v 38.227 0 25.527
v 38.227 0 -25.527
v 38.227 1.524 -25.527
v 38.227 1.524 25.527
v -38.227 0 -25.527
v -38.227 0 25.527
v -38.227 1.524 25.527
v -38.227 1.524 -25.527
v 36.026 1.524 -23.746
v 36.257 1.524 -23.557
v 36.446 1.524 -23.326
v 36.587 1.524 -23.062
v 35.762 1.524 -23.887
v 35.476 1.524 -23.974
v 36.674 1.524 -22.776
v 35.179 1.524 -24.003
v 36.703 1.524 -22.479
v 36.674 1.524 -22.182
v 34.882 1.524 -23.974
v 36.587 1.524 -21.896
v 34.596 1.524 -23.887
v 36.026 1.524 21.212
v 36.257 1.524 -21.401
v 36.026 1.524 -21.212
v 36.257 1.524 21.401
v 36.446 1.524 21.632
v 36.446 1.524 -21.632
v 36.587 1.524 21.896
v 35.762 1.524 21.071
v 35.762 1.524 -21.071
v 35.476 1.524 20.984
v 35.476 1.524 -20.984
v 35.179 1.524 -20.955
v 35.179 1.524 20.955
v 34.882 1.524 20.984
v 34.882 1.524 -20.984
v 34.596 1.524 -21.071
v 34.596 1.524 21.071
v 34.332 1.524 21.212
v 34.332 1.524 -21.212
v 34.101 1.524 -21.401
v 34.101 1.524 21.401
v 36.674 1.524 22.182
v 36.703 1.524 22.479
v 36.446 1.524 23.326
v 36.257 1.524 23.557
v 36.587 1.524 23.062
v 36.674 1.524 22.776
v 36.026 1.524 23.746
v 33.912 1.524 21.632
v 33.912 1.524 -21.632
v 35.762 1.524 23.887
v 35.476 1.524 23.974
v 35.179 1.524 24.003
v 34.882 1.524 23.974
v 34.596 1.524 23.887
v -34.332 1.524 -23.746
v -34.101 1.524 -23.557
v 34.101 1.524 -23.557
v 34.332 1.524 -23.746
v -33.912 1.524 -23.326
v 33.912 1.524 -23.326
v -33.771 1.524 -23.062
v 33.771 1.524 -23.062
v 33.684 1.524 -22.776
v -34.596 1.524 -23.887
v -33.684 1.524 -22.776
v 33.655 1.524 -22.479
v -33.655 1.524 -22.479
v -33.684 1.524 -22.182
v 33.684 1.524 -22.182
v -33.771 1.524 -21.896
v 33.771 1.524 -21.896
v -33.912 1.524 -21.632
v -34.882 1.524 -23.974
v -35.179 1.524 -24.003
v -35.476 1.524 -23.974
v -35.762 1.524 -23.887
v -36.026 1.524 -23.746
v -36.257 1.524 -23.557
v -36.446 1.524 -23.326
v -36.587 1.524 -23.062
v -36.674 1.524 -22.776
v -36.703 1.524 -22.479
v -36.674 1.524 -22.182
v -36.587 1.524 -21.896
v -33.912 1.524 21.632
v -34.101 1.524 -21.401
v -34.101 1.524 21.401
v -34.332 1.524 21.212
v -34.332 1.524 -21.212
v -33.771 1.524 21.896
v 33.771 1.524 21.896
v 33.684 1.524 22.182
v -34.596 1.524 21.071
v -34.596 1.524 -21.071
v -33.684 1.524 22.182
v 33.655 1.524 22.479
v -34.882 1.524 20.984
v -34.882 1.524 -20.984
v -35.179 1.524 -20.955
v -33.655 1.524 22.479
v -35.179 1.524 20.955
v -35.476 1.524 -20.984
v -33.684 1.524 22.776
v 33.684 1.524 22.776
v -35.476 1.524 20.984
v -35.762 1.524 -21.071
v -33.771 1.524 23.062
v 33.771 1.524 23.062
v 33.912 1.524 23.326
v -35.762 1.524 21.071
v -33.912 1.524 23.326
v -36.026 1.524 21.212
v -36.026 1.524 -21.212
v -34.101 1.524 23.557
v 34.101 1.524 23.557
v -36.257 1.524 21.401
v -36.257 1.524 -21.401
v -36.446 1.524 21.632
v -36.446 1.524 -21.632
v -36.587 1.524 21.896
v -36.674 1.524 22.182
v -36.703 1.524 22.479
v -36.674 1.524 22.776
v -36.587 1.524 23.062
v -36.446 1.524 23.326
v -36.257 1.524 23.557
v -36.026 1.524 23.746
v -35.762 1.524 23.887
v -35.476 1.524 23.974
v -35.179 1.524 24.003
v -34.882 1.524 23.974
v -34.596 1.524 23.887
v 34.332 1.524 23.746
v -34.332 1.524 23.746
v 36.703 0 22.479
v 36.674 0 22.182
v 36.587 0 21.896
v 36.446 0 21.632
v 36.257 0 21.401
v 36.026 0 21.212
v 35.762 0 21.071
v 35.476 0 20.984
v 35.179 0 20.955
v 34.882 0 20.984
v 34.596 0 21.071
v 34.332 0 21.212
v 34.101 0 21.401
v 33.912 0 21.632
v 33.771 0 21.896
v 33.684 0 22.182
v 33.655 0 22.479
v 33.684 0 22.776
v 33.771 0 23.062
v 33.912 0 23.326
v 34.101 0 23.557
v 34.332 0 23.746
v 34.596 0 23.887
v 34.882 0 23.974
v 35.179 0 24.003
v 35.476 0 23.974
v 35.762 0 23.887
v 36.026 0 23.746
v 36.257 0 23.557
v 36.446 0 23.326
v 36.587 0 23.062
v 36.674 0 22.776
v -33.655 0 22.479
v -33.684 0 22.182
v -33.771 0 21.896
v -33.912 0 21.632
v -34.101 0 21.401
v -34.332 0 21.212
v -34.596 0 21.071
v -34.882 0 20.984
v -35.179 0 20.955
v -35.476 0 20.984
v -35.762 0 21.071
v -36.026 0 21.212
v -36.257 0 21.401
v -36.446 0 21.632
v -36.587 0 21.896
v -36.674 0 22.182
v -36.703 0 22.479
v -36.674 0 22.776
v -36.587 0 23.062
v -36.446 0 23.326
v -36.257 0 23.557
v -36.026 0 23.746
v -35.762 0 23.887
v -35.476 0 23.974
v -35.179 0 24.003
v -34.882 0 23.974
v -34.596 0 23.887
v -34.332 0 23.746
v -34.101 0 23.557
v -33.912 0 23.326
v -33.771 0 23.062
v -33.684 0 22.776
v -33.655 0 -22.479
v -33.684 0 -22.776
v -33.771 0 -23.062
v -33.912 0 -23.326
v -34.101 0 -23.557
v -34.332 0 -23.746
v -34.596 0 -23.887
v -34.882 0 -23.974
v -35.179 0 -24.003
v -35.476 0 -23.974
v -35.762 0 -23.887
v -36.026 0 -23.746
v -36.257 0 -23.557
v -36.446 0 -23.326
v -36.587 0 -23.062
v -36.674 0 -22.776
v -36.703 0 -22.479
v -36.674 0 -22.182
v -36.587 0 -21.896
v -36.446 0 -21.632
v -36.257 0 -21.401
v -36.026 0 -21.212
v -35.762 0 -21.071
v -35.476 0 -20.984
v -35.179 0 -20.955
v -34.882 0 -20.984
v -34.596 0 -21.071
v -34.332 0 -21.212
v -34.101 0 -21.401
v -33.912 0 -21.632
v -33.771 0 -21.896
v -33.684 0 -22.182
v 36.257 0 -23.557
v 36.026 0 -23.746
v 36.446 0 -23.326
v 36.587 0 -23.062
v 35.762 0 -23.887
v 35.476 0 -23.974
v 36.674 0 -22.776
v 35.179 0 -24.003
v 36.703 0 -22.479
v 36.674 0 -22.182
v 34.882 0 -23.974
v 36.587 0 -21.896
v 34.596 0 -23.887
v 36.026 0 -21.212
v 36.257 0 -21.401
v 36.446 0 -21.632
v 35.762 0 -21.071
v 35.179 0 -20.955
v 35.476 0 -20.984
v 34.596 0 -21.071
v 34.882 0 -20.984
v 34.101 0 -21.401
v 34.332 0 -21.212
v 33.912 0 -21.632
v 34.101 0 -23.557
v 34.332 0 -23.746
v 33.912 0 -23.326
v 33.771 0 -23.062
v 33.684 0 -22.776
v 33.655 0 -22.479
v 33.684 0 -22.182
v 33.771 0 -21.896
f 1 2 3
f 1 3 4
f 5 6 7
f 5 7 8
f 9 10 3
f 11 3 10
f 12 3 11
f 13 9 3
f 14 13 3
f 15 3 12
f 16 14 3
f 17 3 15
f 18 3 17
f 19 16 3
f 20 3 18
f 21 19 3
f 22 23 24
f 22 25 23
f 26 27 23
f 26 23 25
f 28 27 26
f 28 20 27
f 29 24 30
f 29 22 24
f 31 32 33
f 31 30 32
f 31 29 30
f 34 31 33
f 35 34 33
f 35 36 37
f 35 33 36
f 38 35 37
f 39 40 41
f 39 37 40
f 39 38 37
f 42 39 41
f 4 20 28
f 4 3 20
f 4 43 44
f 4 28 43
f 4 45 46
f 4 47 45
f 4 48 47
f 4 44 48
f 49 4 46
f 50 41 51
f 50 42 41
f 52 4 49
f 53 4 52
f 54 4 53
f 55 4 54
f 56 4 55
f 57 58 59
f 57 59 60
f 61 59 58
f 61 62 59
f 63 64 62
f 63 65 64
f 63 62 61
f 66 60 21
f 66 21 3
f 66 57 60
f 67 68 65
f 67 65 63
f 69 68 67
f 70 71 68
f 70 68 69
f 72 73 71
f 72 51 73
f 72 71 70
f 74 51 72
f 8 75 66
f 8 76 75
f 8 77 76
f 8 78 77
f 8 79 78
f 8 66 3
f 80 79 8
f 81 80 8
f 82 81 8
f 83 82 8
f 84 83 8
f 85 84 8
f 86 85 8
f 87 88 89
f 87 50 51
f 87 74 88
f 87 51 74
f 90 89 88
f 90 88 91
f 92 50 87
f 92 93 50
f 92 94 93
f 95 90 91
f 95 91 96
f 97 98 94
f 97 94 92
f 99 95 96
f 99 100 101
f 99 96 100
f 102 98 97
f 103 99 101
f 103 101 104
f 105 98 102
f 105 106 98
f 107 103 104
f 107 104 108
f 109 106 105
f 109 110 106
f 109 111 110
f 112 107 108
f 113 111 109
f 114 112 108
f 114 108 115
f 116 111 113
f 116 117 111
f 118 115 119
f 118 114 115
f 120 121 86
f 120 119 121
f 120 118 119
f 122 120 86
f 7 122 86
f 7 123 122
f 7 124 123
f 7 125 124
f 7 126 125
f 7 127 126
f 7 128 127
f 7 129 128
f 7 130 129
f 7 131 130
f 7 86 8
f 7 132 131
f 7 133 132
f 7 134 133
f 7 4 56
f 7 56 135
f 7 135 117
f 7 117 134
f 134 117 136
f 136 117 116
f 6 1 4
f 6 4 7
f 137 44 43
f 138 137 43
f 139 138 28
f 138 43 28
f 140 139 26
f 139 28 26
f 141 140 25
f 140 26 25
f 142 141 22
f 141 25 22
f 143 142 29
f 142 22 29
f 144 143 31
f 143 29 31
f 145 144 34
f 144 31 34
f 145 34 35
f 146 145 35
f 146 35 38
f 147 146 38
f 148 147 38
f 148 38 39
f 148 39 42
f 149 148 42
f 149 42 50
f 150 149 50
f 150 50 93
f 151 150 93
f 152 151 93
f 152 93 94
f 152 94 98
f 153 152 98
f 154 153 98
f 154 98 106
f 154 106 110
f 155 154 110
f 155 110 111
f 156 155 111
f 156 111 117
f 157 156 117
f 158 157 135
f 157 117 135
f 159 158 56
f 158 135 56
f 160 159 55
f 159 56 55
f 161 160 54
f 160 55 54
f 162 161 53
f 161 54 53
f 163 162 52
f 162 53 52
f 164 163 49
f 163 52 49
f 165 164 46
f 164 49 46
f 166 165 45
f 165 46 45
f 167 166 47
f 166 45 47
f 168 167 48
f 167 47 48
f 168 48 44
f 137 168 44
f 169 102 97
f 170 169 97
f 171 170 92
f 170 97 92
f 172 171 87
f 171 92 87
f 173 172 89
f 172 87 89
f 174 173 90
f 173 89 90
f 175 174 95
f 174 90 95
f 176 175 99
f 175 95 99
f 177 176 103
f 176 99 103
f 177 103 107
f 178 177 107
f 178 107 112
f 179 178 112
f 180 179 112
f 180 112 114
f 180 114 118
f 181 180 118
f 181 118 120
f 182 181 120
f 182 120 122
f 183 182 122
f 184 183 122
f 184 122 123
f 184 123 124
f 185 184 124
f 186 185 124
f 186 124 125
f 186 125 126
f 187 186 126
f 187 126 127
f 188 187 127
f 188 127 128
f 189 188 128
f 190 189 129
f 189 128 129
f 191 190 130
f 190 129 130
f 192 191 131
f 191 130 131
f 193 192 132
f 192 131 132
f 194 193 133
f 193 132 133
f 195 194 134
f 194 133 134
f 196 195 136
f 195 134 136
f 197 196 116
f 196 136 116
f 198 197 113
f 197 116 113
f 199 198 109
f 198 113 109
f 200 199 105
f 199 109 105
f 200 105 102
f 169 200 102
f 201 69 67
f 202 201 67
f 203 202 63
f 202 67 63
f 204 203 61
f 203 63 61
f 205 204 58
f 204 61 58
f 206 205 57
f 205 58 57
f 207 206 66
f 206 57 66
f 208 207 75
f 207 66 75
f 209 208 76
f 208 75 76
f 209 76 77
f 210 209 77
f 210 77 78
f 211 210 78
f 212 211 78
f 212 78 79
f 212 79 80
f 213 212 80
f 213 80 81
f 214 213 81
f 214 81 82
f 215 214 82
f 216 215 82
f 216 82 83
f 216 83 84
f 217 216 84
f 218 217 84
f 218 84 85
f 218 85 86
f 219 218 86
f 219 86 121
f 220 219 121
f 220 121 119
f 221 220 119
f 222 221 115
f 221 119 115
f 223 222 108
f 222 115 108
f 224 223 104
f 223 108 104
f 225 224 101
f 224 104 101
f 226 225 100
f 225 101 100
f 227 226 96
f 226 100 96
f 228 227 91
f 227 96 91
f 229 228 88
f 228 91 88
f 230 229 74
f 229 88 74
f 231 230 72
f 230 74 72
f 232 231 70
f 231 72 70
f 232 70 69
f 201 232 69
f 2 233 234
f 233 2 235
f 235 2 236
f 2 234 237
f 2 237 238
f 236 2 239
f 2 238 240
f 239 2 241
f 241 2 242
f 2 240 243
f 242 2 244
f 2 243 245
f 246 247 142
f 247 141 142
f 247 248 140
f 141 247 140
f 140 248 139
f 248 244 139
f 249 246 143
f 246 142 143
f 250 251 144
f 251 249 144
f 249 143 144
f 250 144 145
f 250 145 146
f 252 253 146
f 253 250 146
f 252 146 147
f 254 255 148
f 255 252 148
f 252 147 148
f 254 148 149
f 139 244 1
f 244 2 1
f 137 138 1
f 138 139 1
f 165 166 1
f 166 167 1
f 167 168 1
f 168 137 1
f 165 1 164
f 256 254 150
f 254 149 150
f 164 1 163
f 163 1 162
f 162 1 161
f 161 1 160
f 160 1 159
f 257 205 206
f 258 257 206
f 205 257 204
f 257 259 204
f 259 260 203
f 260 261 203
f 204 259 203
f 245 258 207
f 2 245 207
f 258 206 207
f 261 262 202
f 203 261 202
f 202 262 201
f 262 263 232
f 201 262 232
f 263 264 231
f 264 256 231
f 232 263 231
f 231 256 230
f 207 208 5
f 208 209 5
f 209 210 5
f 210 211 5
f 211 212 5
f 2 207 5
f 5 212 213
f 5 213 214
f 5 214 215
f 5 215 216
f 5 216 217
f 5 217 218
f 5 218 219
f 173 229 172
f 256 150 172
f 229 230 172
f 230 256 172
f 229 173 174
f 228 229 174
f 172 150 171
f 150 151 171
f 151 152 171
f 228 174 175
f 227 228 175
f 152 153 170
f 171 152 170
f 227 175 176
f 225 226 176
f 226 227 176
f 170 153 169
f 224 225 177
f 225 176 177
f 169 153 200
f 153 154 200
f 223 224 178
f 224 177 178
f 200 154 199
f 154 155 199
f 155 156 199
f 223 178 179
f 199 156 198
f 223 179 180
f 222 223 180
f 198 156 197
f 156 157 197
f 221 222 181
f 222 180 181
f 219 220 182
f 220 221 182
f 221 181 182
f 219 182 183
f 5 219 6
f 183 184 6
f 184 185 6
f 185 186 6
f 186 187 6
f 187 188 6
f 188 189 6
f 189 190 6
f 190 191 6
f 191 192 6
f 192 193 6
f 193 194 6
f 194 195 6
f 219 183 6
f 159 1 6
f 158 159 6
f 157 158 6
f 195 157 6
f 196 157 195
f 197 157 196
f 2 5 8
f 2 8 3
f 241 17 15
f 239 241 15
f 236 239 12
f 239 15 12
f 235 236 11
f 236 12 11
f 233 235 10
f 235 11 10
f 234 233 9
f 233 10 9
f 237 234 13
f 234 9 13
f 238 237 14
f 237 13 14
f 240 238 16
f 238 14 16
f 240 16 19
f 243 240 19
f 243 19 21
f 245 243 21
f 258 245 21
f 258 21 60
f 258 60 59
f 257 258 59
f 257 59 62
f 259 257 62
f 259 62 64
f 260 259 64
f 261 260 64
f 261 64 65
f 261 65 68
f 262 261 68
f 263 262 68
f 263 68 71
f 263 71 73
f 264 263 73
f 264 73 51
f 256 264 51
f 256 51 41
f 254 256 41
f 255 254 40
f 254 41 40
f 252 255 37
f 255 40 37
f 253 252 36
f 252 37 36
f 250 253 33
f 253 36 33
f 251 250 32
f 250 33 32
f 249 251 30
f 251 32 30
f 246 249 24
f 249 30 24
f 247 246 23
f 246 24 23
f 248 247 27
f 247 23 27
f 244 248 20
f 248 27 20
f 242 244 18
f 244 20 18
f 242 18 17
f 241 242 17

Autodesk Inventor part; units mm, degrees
ref_plane "YZ Plane" through (0, 0, 0) normal (1, 0, 0) x (0, 1, 0)
ref_plane "XZ Plane" through (0, 0, 0) normal (0, 1, 0) x (-1, 0, 0)
ref_plane "XY Plane" through (0, 0, 0) normal (0, 0, 1) x (1, 0, 0)
sketch "Sketch1" plane through (0, 0, 0) normal (0, 1, 0) x (-1, 0, 0)
  line L0 (-38.227, 25.527) -> (38.227, 25.527)
  line L1 (38.227, 25.527) -> (38.227, -25.527)
  line L2 (38.227, -25.527) -> (-38.227, -25.527)
  line L3 (-38.227, -25.527) -> (-38.227, 25.527)
  line L4 (-38.227, 25.527) -> (38.227, -25.527) construction
  point P0 (0, 0)
  point P1 (0, 0)
  dimension "d0" = 76.454
  dimension "d1" = 51.054
extrude "Extrusion1" add sketch "Sketch1" along normal blind 1.524
sketch "Sketch2" plane through (0, 1.524, 0) normal (0, 1, 0) x (1, 0, 0)
  line L0 (-38.227, -25.527) -> (38.227, -25.527) projected
  line L1 (38.227, -25.527) -> (38.227, 25.527) projected
  line L2 (38.227, 25.527) -> (-38.227, 25.527) projected
  line L3 (-38.227, 25.527) -> (-38.227, -25.527) projected
  circle A0 centre (-35.179, 22.479) radius 1.524
  circle A1 centre (-35.179, -22.479) radius 1.524
  circle A2 centre (35.179, 22.479) radius 1.524
  circle A3 centre (35.179, -22.479) radius 1.524
  point P0 (0, 0)
  dimension "d4" = 3.048
  dimension "d5" = 3.048
  dimension "d6" = 3.048
  dimension "d7" = 3.048
  dimension "d8" = 3.048
  dimension "d9" = 3.048
  dimension "d10" = 3.048
  dimension "d11" = 3.048
  dimension "d12" = 3.048
extrude "Extrusion2" cut sketch "Sketch2" against normal up to next contours A0 | A1 | A2 | A3
properties part number "MainBoard" material "Silicon Nitride"
